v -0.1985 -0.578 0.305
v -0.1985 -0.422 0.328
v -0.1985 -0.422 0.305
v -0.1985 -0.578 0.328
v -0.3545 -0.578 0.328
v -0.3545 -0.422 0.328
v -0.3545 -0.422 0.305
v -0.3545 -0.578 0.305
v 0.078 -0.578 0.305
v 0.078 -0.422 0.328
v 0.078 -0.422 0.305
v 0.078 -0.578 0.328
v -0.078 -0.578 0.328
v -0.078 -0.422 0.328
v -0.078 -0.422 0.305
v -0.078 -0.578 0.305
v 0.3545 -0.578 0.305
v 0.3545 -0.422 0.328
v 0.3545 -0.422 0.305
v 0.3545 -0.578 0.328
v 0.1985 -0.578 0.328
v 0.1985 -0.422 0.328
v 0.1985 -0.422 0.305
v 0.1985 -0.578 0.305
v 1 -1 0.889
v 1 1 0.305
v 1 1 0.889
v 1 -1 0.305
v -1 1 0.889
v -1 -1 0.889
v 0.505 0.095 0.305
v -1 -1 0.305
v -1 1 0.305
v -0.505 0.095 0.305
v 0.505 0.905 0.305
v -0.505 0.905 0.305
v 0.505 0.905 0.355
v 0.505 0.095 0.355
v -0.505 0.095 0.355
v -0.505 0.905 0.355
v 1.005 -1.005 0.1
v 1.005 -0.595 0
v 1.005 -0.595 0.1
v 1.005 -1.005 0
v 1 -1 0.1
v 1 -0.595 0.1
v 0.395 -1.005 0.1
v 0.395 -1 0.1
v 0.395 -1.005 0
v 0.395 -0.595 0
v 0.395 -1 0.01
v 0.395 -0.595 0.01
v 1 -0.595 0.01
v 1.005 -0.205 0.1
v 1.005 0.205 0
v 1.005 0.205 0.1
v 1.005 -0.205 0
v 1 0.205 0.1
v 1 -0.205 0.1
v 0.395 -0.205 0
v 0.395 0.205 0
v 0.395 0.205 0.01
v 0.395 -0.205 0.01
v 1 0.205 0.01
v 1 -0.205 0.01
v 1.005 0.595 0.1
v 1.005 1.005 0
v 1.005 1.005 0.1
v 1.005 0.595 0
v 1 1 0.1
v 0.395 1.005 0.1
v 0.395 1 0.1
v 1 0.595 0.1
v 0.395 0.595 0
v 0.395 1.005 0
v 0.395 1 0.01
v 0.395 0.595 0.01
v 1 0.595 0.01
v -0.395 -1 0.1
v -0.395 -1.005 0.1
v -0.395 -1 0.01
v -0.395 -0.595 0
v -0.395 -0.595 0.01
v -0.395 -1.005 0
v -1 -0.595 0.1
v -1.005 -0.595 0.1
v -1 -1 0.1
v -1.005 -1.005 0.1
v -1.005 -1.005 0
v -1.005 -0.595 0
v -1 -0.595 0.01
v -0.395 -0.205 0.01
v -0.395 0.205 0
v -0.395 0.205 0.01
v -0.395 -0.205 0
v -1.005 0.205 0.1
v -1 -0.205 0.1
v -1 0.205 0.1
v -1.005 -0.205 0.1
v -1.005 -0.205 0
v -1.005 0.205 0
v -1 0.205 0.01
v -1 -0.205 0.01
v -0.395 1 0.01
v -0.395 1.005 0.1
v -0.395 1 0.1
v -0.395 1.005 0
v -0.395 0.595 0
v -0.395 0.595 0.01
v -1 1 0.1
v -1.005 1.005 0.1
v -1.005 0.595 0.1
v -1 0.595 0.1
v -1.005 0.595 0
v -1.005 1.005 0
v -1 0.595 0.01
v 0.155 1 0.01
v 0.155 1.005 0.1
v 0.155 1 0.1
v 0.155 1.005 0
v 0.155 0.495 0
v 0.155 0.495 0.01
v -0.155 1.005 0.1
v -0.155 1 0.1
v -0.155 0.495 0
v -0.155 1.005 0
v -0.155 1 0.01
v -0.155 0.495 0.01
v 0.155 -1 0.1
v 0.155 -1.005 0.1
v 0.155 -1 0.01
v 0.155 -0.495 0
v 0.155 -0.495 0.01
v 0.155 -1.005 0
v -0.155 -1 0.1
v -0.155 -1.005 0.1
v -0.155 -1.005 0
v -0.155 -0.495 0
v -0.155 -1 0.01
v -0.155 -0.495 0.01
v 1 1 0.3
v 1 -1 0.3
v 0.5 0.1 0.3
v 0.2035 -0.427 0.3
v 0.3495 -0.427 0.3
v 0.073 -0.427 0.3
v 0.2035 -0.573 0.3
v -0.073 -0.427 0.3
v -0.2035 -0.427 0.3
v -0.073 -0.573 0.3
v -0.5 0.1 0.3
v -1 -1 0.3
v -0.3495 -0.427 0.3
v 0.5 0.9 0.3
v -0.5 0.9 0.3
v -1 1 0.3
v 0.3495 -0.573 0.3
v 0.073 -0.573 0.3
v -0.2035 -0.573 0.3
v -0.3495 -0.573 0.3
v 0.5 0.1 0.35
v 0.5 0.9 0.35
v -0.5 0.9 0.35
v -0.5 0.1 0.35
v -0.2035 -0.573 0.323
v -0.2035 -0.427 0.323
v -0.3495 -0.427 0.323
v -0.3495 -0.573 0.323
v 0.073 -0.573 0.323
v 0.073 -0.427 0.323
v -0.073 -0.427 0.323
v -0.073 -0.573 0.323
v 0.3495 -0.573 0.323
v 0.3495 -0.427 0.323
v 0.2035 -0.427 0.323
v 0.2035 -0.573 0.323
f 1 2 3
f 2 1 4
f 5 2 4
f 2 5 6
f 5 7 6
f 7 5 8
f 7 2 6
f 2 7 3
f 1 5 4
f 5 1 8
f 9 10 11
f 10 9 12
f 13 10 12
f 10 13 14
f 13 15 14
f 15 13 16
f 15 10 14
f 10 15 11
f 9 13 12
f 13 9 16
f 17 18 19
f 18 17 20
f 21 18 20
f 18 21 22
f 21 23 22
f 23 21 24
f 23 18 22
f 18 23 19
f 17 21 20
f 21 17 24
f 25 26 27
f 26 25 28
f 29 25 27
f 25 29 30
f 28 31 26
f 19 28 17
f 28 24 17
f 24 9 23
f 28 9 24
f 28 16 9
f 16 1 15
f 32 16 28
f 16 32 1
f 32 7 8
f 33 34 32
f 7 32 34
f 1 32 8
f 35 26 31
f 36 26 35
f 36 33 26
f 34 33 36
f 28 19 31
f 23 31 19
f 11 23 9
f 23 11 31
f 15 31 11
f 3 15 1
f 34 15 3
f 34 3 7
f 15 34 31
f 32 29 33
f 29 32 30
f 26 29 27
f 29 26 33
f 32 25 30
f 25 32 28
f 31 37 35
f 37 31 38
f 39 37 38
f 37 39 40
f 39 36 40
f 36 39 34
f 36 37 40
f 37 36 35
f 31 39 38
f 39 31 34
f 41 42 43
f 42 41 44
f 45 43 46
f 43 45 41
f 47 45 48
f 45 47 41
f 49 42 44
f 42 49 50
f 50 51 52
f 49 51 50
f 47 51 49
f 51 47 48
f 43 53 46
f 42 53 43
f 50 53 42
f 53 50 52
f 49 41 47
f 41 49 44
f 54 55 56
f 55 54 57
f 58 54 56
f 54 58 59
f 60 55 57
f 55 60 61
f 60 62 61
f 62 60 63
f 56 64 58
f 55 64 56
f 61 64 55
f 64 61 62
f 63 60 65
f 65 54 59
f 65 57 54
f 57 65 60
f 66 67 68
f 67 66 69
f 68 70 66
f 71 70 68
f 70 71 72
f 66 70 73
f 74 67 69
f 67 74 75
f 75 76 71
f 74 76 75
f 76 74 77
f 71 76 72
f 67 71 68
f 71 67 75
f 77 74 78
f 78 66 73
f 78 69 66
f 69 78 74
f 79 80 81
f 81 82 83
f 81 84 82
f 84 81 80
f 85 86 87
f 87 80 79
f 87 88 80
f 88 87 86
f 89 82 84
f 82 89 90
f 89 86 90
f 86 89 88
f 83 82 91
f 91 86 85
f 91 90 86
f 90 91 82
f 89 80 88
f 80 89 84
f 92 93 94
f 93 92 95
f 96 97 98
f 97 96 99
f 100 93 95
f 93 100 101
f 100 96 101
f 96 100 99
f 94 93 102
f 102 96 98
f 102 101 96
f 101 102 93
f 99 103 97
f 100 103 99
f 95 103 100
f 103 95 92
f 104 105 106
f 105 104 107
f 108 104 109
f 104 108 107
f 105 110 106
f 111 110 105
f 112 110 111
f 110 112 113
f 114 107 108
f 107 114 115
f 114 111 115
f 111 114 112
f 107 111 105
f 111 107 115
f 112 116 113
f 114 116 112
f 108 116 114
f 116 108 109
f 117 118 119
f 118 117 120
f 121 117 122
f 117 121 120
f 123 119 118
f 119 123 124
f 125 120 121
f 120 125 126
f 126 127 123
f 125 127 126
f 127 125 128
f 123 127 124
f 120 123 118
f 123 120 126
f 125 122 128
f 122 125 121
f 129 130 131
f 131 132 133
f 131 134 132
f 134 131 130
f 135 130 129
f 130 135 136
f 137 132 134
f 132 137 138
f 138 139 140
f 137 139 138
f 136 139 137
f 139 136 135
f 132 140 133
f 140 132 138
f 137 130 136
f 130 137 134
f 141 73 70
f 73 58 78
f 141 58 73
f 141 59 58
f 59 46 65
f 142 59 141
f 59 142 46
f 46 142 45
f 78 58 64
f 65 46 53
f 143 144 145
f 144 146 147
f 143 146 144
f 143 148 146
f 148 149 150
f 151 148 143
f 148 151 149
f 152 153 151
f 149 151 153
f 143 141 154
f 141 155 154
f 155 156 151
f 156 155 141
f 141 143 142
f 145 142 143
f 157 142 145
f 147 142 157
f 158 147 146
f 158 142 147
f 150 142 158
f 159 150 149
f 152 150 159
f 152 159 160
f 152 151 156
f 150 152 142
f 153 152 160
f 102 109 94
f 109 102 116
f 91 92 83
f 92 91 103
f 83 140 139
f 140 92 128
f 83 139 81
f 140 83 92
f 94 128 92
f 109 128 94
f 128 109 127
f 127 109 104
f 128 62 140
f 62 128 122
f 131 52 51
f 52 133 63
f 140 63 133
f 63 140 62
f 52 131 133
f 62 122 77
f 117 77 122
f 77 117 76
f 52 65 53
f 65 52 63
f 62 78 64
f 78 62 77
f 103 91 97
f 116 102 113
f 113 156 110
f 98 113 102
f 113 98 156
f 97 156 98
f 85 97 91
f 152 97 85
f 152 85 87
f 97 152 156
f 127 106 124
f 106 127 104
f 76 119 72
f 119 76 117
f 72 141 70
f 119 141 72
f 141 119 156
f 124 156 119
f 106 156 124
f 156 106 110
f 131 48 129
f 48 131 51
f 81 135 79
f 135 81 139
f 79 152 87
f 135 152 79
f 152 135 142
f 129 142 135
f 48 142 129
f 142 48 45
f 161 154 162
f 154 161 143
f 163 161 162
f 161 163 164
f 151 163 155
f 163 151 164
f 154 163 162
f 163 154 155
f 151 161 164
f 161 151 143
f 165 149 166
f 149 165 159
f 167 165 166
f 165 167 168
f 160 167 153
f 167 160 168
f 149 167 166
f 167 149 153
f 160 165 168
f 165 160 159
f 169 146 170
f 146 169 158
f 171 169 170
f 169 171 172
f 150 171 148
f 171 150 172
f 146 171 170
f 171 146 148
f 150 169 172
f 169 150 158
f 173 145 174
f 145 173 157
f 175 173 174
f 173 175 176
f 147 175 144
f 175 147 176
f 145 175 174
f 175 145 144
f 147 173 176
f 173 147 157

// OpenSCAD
APA102();
module APA102(){
  //APA102-2020
  //http://www.normandled.com/upload/201807/APA102-2020%20LED%20Datasheet.pdf
  
  //alias Adafruit Dotstar
  ovDims=[2,2,0.9];
  padDims=[0.6,0.4,0.1];
  ICDims=[1,0.8,0.1];
  mfudge=0.01; //microfudge
  ICPos=[0,0.5,0.3];
  
  //PCB
  color("darkgreen") translate([0,0,ovDims.z/6+mfudge/2]) cube([ovDims.x,ovDims.y,ovDims.z/3-mfudge],true);
  //Resin
  difference(){
    color("gold",0.5) translate([0,0,ovDims.z*0.66/2+ovDims.z/3]) cube([ovDims.x,ovDims.y,ovDims.z*0.66-mfudge],true);
    translate(ICPos) cube(ICDims+[mfudge,mfudge,mfudge],true); //substract IC cavity to make transparency work
    for (i=[-0.2765,0,0.2765]) translate([i,-0.5,0.25]) cube(0.146+mfudge,true);
  }
  //pads
  for (i=[1,-1],j=[-1,0,1])
    color("silver") translate([i*(1-padDims.x/2),j*(1-padDims.y/2),padDims.z/2]) cube(padDims+[mfudge,mfudge,0],true);
  for (j=[1,-1])
    color("silver") translate([0,j*(1-0.5/2),padDims.z/2]) cube([0.3+mfudge,0.5+mfudge,padDims.z],true);
  //IC
  color("darkslategrey") translate(ICPos) cube([1,0.8,0.1],true);
  //LEDs (yes, really)
  
    color("red") translate([-0.2765,-0.5,0.25]) cube(0.146,true);
    color("green") translate([0,-0.5,0.25]) cube(0.146,true);
    color("blue") translate([0.2765,-0.5,0.25]) cube(0.146,true);
}
